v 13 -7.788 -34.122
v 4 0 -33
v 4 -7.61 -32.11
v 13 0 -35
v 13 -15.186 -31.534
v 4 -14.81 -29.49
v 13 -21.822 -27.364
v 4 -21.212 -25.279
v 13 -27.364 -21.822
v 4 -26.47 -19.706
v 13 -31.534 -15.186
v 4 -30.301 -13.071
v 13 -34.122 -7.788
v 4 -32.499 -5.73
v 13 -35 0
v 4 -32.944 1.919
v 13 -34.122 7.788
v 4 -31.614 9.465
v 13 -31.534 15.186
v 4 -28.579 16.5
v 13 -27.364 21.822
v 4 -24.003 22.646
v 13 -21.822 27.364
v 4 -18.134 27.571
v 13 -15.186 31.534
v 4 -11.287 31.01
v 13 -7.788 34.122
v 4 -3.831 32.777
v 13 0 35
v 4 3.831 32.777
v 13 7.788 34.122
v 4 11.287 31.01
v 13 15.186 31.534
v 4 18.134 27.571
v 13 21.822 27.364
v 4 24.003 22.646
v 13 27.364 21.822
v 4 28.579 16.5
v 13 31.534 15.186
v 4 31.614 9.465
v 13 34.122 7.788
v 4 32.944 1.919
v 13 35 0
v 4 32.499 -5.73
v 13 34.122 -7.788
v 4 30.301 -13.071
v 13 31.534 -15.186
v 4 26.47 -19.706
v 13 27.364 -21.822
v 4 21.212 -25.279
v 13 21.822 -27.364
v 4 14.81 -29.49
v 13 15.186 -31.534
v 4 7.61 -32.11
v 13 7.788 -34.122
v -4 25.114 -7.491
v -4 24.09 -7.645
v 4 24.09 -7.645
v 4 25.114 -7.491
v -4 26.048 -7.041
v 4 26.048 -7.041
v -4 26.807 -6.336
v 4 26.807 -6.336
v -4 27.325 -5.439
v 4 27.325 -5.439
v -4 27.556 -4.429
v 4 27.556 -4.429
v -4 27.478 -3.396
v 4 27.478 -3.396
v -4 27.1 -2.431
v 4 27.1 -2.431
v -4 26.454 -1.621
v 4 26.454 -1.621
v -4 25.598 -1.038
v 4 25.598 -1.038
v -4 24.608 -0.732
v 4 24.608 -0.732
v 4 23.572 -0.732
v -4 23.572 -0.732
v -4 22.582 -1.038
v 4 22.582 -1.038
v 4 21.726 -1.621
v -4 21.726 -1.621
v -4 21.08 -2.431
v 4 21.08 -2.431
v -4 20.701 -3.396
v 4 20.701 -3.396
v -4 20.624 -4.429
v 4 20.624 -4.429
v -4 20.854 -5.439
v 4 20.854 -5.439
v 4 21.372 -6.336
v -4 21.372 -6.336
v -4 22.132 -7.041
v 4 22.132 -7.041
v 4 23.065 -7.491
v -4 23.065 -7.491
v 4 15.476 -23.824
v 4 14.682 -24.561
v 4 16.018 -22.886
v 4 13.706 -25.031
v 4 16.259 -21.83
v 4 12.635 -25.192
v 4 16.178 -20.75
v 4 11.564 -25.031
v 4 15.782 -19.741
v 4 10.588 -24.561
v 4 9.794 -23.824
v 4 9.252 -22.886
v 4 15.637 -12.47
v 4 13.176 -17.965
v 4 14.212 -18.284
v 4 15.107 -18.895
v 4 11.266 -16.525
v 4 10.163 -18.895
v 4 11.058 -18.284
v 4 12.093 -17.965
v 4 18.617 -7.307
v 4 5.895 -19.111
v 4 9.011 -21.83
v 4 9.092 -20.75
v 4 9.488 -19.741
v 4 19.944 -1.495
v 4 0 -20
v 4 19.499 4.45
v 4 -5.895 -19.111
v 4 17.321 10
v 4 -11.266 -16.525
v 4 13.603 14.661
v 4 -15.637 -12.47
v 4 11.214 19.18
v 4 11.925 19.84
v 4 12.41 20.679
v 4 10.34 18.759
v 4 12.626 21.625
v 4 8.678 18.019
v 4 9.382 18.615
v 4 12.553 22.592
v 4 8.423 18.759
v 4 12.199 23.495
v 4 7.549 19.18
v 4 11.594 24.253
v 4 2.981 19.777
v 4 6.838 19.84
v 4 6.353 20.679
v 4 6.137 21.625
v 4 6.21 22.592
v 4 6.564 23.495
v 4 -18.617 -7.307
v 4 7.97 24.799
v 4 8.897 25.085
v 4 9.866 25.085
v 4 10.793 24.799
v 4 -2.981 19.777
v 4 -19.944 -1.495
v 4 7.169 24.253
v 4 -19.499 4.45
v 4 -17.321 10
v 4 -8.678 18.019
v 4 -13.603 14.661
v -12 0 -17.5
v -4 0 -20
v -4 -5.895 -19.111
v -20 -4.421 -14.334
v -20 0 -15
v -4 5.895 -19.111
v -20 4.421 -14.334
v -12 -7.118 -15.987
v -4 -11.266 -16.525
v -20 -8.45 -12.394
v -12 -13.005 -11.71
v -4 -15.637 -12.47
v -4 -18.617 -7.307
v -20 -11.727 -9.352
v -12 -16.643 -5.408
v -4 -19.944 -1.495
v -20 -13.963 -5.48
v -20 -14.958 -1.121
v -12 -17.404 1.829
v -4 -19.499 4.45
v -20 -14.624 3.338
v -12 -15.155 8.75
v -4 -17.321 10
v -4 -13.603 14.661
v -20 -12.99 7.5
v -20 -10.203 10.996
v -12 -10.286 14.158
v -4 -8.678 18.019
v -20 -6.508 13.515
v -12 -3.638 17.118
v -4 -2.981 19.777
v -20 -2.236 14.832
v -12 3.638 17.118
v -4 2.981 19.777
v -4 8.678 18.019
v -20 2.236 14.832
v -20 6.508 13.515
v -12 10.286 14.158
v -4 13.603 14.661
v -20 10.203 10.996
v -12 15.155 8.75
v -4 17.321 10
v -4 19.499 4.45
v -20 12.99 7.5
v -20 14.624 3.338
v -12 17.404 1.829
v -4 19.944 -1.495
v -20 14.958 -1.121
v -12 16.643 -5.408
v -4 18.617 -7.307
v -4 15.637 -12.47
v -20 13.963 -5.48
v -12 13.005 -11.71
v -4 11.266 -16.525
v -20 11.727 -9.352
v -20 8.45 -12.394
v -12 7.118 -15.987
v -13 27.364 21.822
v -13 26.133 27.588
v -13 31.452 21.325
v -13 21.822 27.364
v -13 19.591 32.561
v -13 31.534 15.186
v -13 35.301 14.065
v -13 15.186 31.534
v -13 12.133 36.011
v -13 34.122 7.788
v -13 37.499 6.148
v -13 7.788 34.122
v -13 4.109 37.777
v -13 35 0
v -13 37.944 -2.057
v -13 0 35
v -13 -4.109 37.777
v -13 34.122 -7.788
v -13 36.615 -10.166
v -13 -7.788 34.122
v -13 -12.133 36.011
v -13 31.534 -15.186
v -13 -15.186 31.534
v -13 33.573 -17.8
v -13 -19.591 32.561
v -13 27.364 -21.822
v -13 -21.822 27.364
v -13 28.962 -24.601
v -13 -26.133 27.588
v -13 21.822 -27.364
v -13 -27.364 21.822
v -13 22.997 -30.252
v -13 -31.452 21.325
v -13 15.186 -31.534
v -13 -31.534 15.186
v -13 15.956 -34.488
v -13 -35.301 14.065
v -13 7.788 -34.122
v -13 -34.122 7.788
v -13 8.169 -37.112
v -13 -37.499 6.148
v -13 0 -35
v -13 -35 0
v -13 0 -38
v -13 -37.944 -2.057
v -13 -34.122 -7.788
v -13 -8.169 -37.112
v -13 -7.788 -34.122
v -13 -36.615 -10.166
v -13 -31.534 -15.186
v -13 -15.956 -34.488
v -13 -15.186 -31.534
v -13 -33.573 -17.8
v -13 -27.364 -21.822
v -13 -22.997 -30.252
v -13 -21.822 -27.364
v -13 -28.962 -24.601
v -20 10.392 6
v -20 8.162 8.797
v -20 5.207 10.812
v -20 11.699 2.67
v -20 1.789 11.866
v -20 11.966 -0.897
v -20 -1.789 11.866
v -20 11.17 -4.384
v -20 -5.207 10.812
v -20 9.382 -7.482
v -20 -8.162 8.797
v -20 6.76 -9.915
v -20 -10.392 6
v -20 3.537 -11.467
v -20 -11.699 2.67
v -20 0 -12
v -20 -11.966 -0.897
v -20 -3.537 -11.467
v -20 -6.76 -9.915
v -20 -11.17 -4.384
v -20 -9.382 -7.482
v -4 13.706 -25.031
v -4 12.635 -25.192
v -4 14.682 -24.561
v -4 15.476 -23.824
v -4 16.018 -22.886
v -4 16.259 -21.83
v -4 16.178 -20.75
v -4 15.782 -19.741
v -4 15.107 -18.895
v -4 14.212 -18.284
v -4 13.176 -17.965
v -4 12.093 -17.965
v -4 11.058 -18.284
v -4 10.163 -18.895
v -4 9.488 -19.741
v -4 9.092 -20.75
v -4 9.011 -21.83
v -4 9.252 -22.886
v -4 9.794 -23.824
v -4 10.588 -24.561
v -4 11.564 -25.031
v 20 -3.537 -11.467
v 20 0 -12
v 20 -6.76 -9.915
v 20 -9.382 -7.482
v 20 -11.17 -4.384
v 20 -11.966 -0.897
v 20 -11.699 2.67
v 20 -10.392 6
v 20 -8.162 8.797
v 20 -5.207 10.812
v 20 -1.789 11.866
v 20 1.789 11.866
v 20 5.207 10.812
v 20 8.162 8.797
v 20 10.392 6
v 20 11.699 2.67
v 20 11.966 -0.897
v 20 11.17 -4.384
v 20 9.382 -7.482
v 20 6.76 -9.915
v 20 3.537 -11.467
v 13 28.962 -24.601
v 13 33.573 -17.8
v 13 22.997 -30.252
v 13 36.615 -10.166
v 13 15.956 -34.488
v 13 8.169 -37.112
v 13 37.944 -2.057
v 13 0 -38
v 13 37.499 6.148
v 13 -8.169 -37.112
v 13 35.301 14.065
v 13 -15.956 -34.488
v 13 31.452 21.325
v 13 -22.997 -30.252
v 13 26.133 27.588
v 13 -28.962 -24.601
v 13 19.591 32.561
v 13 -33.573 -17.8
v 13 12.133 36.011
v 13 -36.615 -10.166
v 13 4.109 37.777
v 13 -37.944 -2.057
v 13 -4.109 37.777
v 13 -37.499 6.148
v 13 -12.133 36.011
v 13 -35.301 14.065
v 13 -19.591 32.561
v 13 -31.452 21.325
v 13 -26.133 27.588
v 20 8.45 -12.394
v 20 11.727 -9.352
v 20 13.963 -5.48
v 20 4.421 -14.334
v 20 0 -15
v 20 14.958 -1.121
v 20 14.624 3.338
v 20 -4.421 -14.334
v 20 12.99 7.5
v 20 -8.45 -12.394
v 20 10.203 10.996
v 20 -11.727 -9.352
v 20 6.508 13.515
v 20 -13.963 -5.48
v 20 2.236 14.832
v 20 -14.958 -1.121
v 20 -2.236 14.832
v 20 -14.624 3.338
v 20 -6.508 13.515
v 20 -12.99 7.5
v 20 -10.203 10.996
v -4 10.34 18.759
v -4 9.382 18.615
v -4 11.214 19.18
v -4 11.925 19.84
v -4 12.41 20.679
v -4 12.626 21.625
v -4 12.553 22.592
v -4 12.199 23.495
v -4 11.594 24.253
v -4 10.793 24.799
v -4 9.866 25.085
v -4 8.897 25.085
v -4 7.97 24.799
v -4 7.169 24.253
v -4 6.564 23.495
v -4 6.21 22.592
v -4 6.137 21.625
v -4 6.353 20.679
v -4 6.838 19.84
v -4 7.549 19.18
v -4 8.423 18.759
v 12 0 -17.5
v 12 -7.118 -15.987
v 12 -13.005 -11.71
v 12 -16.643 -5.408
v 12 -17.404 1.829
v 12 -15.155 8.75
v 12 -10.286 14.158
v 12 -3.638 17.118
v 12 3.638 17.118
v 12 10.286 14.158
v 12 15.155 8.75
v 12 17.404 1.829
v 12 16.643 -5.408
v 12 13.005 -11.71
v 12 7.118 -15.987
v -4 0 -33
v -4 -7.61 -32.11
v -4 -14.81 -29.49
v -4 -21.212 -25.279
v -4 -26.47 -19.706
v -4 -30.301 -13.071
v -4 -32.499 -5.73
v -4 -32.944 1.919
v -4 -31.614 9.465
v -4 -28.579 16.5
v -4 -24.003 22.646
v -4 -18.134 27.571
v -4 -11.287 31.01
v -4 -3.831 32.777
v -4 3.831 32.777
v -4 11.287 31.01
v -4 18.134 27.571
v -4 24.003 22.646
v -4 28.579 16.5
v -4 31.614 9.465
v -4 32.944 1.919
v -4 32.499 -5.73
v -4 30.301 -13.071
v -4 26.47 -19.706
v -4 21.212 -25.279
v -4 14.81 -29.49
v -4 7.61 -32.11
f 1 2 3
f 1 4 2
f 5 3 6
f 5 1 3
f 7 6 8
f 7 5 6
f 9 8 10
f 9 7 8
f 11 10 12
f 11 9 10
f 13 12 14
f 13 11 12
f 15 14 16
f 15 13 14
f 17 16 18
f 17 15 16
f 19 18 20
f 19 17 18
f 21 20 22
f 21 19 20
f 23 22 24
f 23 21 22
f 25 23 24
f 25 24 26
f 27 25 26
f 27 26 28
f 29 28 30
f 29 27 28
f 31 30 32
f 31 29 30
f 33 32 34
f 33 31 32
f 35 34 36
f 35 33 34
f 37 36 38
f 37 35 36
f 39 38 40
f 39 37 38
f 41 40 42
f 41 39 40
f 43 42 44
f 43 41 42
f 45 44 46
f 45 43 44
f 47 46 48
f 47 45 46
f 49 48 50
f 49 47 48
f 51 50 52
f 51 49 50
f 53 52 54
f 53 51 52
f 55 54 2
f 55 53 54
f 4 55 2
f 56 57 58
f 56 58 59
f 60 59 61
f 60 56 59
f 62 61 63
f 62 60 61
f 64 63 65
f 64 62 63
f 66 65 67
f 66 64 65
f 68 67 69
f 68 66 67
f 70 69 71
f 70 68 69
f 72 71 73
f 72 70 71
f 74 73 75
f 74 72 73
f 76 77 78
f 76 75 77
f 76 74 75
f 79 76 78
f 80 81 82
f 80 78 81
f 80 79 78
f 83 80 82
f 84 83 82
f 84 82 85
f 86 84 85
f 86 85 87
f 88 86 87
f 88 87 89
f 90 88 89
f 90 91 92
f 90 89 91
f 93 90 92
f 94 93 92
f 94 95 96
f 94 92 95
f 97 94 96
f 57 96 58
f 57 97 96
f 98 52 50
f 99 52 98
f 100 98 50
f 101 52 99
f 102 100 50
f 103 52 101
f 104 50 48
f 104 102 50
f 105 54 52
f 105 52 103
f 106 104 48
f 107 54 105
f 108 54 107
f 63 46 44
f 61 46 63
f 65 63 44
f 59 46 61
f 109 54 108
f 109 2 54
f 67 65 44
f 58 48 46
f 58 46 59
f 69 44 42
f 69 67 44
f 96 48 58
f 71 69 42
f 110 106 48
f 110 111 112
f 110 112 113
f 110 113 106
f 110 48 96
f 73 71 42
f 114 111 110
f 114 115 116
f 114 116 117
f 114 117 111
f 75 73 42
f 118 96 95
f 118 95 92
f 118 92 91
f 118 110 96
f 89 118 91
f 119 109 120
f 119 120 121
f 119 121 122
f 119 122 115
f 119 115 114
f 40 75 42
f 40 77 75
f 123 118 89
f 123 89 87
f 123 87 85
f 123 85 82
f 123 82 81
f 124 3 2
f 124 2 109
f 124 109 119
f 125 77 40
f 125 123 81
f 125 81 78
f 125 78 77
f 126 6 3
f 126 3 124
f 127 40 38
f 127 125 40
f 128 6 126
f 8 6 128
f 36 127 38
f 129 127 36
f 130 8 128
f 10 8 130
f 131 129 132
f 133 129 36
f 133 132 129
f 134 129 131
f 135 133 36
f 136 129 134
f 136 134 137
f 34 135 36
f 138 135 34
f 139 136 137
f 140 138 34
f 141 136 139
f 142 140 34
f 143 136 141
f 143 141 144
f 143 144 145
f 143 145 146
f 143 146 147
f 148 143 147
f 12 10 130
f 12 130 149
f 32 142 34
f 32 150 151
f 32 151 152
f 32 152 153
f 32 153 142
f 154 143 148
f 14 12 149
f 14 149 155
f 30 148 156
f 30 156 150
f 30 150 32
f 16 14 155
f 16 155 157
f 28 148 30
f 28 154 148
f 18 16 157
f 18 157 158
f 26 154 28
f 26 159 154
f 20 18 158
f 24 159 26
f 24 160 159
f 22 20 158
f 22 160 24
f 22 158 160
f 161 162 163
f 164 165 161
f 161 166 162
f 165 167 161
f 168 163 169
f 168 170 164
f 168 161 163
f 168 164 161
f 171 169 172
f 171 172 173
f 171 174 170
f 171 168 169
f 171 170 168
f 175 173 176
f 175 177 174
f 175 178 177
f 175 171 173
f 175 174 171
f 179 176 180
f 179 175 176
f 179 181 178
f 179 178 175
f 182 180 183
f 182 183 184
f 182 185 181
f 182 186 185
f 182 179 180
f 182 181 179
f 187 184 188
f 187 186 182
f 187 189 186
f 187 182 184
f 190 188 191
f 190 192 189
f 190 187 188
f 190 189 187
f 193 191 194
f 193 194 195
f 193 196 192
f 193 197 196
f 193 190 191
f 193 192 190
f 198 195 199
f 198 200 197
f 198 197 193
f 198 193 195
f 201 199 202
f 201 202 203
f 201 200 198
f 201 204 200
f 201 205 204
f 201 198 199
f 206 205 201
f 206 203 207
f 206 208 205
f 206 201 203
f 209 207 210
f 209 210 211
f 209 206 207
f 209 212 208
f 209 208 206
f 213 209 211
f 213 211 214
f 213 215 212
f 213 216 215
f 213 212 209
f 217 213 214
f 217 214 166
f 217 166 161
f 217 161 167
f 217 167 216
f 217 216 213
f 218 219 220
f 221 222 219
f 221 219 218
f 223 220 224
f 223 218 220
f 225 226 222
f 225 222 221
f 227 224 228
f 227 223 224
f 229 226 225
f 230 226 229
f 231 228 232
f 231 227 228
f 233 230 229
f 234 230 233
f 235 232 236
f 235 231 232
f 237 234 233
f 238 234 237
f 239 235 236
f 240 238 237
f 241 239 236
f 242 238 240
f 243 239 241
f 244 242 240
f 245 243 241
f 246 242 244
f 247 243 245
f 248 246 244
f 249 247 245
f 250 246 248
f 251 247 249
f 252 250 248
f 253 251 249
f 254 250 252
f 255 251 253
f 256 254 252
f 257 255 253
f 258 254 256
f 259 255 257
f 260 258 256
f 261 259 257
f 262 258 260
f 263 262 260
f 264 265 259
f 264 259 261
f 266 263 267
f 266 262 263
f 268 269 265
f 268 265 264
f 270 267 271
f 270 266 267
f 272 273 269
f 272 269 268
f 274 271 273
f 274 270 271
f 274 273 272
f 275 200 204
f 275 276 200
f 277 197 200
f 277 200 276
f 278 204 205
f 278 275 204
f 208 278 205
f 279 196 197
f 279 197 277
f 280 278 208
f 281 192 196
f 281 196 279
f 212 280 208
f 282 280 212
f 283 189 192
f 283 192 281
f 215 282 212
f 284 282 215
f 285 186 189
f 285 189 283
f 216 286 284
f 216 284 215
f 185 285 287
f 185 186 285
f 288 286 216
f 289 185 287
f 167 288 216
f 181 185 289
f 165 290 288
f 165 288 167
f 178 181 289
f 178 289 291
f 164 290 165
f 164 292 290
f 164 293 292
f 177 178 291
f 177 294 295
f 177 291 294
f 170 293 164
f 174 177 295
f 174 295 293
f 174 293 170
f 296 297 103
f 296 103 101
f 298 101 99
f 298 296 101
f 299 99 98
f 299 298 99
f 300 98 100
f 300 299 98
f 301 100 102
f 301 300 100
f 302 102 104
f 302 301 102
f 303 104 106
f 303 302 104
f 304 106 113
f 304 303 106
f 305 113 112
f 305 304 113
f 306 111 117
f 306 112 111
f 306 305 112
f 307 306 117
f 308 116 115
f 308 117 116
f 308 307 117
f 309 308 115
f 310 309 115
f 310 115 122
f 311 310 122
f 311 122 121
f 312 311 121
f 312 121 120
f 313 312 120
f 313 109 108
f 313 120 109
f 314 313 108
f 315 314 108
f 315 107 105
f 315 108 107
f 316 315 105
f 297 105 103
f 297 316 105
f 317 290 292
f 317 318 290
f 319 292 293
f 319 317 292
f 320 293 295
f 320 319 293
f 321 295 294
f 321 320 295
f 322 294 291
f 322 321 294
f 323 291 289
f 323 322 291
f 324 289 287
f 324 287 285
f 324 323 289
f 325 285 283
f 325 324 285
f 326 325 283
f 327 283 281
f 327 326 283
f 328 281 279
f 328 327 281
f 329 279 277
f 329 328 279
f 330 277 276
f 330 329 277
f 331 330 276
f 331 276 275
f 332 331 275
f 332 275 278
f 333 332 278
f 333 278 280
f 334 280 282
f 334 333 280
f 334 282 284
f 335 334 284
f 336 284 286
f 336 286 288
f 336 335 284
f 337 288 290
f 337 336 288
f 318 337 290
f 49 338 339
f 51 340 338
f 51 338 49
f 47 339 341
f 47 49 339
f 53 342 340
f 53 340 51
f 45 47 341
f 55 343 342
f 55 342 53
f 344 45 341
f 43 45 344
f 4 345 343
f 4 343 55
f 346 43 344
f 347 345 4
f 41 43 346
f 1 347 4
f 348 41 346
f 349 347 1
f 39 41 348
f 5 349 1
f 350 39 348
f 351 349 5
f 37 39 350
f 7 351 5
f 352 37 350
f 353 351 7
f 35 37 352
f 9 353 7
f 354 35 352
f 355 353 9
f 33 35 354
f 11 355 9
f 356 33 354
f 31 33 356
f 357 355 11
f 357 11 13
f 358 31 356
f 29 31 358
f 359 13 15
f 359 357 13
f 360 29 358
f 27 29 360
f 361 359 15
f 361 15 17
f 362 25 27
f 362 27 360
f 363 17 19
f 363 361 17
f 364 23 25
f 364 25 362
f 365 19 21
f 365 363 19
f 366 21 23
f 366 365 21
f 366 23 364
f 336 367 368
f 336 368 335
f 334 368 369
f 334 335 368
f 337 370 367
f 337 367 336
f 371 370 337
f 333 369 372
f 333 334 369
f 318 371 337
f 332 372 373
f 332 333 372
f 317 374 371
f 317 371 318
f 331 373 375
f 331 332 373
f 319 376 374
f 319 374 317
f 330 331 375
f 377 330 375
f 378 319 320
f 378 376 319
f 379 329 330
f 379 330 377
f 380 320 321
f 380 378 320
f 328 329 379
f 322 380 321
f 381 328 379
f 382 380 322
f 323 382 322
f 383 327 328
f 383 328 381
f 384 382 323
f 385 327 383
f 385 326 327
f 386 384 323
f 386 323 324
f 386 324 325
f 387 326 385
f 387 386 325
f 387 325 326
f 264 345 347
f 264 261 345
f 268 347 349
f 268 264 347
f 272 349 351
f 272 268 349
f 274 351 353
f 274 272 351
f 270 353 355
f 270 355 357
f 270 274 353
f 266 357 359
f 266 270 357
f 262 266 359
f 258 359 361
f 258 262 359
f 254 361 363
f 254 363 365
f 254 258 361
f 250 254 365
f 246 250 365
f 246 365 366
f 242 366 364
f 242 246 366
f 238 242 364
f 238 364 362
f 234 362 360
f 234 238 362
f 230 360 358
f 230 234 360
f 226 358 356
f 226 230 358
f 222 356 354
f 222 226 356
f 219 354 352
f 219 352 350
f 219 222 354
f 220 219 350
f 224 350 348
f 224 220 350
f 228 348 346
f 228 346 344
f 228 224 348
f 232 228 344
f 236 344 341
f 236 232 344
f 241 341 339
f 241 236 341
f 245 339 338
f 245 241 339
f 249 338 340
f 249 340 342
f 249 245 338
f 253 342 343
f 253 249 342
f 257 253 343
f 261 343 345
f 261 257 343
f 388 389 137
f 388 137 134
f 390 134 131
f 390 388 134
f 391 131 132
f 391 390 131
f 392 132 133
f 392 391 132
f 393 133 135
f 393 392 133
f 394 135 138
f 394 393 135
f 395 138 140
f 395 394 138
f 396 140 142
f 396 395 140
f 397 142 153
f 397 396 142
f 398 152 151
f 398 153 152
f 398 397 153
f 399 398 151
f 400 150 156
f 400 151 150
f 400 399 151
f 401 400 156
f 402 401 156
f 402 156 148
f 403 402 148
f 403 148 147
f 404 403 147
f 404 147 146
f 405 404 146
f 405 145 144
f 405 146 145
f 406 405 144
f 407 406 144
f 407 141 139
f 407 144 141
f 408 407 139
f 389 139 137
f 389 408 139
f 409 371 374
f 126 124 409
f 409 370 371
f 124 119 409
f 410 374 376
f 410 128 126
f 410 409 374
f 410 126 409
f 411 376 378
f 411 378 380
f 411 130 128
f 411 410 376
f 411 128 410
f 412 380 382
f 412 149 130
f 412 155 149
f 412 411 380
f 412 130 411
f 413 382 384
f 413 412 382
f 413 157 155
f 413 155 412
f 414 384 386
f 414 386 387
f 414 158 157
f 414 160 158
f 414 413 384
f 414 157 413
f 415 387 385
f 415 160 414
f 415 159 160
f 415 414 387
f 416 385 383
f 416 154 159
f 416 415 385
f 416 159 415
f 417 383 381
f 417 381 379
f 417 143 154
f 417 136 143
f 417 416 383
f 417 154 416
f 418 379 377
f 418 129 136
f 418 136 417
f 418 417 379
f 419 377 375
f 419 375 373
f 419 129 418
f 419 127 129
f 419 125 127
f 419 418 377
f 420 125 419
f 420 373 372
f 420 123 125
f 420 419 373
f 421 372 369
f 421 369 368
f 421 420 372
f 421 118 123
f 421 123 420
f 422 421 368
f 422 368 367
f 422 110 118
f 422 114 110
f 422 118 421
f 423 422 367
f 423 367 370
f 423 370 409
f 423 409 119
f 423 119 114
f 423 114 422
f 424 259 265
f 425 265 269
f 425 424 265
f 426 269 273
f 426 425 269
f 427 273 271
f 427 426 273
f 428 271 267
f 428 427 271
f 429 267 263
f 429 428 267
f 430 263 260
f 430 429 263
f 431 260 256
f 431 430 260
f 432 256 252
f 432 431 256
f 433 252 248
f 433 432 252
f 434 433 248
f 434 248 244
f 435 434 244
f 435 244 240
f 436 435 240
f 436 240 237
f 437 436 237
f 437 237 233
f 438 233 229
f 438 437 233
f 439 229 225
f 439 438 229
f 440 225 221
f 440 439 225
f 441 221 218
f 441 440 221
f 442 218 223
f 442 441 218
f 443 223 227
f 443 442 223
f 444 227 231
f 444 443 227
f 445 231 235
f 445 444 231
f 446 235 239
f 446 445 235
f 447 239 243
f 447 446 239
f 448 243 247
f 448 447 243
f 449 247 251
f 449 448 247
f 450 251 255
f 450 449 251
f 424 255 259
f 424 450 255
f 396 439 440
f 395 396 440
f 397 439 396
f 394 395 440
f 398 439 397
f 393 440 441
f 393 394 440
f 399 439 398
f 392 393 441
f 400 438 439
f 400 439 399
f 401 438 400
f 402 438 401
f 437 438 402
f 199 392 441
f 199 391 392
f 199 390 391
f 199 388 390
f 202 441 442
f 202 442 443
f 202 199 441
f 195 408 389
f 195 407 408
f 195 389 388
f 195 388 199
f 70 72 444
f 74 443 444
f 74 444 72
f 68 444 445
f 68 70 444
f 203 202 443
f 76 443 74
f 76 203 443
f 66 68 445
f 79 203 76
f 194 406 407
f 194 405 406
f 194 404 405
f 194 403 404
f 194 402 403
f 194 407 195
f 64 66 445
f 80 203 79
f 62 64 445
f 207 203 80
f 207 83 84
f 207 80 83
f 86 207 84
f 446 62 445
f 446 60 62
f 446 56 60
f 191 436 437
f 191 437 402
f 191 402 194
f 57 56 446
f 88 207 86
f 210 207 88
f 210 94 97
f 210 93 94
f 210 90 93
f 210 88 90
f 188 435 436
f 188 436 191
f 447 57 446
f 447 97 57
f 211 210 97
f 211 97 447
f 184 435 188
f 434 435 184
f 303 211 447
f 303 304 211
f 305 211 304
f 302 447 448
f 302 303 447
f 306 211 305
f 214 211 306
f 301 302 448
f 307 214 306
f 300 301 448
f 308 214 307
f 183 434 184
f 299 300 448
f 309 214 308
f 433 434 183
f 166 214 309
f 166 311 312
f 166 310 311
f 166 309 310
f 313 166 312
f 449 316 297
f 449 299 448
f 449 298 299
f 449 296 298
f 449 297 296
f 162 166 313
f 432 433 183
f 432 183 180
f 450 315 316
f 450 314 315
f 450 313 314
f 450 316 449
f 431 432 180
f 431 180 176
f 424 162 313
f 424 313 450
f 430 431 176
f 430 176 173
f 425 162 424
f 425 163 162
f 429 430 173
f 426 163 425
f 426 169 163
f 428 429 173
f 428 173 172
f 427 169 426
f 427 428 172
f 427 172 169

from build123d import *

# Parameters (mm, degrees)
CUT_EXTRUDE1_DEPTH      = 59.855755878
CUT_EXTRUDE1_DEPTH_BACK = 59.855755878
SKETCH2_R               = 3.253242351
SKETCH2_R_2             = 3.475880092
SKETCH2_R_3             = 3.633937036


with BuildPart() as part:
    # Sketch1 → Revolve2 (revolve)
    with BuildSketch(Plane.XY, mode=Mode.PRIVATE) as revolve2_sk:
        Polygon((20, 12), (20, 15), (4, 20), (4, 33), (13, 35), (13, 38), (-13, 38), (-13, 35), (-4, 33), (-4, 20), (-20, 15), (-20, 12), align=None)
    revolve(revolve2_sk.sketch.rotate(Axis((29.536406987, 0, 0), (-1, 0, 0)), 90), axis=Axis((29.536406987, 0, 0), (-1, 0, 0)))

    # Sketch2 → Cut-Extrude1 (cut, two sides: drawn at the far end of the back side and taken through both)
    with BuildSketch(Plane(origin=(4, 0, 0), x_dir=(0, 0, -1), z_dir=(1, 0, 0)).offset(-CUT_EXTRUDE1_DEPTH_BACK)):
        with Locations((-21.868025182, 9.381578111)):
            Circle(SKETCH2_R)
        with Locations((4.169252075, 24.089721188)):
            Circle(SKETCH2_R_2)
        with Locations((21.558463792, 12.634820462)):
            Circle(SKETCH2_R_3)
    extrude(amount=CUT_EXTRUDE1_DEPTH + CUT_EXTRUDE1_DEPTH_BACK, mode=Mode.SUBTRACT)


solid = part.part
